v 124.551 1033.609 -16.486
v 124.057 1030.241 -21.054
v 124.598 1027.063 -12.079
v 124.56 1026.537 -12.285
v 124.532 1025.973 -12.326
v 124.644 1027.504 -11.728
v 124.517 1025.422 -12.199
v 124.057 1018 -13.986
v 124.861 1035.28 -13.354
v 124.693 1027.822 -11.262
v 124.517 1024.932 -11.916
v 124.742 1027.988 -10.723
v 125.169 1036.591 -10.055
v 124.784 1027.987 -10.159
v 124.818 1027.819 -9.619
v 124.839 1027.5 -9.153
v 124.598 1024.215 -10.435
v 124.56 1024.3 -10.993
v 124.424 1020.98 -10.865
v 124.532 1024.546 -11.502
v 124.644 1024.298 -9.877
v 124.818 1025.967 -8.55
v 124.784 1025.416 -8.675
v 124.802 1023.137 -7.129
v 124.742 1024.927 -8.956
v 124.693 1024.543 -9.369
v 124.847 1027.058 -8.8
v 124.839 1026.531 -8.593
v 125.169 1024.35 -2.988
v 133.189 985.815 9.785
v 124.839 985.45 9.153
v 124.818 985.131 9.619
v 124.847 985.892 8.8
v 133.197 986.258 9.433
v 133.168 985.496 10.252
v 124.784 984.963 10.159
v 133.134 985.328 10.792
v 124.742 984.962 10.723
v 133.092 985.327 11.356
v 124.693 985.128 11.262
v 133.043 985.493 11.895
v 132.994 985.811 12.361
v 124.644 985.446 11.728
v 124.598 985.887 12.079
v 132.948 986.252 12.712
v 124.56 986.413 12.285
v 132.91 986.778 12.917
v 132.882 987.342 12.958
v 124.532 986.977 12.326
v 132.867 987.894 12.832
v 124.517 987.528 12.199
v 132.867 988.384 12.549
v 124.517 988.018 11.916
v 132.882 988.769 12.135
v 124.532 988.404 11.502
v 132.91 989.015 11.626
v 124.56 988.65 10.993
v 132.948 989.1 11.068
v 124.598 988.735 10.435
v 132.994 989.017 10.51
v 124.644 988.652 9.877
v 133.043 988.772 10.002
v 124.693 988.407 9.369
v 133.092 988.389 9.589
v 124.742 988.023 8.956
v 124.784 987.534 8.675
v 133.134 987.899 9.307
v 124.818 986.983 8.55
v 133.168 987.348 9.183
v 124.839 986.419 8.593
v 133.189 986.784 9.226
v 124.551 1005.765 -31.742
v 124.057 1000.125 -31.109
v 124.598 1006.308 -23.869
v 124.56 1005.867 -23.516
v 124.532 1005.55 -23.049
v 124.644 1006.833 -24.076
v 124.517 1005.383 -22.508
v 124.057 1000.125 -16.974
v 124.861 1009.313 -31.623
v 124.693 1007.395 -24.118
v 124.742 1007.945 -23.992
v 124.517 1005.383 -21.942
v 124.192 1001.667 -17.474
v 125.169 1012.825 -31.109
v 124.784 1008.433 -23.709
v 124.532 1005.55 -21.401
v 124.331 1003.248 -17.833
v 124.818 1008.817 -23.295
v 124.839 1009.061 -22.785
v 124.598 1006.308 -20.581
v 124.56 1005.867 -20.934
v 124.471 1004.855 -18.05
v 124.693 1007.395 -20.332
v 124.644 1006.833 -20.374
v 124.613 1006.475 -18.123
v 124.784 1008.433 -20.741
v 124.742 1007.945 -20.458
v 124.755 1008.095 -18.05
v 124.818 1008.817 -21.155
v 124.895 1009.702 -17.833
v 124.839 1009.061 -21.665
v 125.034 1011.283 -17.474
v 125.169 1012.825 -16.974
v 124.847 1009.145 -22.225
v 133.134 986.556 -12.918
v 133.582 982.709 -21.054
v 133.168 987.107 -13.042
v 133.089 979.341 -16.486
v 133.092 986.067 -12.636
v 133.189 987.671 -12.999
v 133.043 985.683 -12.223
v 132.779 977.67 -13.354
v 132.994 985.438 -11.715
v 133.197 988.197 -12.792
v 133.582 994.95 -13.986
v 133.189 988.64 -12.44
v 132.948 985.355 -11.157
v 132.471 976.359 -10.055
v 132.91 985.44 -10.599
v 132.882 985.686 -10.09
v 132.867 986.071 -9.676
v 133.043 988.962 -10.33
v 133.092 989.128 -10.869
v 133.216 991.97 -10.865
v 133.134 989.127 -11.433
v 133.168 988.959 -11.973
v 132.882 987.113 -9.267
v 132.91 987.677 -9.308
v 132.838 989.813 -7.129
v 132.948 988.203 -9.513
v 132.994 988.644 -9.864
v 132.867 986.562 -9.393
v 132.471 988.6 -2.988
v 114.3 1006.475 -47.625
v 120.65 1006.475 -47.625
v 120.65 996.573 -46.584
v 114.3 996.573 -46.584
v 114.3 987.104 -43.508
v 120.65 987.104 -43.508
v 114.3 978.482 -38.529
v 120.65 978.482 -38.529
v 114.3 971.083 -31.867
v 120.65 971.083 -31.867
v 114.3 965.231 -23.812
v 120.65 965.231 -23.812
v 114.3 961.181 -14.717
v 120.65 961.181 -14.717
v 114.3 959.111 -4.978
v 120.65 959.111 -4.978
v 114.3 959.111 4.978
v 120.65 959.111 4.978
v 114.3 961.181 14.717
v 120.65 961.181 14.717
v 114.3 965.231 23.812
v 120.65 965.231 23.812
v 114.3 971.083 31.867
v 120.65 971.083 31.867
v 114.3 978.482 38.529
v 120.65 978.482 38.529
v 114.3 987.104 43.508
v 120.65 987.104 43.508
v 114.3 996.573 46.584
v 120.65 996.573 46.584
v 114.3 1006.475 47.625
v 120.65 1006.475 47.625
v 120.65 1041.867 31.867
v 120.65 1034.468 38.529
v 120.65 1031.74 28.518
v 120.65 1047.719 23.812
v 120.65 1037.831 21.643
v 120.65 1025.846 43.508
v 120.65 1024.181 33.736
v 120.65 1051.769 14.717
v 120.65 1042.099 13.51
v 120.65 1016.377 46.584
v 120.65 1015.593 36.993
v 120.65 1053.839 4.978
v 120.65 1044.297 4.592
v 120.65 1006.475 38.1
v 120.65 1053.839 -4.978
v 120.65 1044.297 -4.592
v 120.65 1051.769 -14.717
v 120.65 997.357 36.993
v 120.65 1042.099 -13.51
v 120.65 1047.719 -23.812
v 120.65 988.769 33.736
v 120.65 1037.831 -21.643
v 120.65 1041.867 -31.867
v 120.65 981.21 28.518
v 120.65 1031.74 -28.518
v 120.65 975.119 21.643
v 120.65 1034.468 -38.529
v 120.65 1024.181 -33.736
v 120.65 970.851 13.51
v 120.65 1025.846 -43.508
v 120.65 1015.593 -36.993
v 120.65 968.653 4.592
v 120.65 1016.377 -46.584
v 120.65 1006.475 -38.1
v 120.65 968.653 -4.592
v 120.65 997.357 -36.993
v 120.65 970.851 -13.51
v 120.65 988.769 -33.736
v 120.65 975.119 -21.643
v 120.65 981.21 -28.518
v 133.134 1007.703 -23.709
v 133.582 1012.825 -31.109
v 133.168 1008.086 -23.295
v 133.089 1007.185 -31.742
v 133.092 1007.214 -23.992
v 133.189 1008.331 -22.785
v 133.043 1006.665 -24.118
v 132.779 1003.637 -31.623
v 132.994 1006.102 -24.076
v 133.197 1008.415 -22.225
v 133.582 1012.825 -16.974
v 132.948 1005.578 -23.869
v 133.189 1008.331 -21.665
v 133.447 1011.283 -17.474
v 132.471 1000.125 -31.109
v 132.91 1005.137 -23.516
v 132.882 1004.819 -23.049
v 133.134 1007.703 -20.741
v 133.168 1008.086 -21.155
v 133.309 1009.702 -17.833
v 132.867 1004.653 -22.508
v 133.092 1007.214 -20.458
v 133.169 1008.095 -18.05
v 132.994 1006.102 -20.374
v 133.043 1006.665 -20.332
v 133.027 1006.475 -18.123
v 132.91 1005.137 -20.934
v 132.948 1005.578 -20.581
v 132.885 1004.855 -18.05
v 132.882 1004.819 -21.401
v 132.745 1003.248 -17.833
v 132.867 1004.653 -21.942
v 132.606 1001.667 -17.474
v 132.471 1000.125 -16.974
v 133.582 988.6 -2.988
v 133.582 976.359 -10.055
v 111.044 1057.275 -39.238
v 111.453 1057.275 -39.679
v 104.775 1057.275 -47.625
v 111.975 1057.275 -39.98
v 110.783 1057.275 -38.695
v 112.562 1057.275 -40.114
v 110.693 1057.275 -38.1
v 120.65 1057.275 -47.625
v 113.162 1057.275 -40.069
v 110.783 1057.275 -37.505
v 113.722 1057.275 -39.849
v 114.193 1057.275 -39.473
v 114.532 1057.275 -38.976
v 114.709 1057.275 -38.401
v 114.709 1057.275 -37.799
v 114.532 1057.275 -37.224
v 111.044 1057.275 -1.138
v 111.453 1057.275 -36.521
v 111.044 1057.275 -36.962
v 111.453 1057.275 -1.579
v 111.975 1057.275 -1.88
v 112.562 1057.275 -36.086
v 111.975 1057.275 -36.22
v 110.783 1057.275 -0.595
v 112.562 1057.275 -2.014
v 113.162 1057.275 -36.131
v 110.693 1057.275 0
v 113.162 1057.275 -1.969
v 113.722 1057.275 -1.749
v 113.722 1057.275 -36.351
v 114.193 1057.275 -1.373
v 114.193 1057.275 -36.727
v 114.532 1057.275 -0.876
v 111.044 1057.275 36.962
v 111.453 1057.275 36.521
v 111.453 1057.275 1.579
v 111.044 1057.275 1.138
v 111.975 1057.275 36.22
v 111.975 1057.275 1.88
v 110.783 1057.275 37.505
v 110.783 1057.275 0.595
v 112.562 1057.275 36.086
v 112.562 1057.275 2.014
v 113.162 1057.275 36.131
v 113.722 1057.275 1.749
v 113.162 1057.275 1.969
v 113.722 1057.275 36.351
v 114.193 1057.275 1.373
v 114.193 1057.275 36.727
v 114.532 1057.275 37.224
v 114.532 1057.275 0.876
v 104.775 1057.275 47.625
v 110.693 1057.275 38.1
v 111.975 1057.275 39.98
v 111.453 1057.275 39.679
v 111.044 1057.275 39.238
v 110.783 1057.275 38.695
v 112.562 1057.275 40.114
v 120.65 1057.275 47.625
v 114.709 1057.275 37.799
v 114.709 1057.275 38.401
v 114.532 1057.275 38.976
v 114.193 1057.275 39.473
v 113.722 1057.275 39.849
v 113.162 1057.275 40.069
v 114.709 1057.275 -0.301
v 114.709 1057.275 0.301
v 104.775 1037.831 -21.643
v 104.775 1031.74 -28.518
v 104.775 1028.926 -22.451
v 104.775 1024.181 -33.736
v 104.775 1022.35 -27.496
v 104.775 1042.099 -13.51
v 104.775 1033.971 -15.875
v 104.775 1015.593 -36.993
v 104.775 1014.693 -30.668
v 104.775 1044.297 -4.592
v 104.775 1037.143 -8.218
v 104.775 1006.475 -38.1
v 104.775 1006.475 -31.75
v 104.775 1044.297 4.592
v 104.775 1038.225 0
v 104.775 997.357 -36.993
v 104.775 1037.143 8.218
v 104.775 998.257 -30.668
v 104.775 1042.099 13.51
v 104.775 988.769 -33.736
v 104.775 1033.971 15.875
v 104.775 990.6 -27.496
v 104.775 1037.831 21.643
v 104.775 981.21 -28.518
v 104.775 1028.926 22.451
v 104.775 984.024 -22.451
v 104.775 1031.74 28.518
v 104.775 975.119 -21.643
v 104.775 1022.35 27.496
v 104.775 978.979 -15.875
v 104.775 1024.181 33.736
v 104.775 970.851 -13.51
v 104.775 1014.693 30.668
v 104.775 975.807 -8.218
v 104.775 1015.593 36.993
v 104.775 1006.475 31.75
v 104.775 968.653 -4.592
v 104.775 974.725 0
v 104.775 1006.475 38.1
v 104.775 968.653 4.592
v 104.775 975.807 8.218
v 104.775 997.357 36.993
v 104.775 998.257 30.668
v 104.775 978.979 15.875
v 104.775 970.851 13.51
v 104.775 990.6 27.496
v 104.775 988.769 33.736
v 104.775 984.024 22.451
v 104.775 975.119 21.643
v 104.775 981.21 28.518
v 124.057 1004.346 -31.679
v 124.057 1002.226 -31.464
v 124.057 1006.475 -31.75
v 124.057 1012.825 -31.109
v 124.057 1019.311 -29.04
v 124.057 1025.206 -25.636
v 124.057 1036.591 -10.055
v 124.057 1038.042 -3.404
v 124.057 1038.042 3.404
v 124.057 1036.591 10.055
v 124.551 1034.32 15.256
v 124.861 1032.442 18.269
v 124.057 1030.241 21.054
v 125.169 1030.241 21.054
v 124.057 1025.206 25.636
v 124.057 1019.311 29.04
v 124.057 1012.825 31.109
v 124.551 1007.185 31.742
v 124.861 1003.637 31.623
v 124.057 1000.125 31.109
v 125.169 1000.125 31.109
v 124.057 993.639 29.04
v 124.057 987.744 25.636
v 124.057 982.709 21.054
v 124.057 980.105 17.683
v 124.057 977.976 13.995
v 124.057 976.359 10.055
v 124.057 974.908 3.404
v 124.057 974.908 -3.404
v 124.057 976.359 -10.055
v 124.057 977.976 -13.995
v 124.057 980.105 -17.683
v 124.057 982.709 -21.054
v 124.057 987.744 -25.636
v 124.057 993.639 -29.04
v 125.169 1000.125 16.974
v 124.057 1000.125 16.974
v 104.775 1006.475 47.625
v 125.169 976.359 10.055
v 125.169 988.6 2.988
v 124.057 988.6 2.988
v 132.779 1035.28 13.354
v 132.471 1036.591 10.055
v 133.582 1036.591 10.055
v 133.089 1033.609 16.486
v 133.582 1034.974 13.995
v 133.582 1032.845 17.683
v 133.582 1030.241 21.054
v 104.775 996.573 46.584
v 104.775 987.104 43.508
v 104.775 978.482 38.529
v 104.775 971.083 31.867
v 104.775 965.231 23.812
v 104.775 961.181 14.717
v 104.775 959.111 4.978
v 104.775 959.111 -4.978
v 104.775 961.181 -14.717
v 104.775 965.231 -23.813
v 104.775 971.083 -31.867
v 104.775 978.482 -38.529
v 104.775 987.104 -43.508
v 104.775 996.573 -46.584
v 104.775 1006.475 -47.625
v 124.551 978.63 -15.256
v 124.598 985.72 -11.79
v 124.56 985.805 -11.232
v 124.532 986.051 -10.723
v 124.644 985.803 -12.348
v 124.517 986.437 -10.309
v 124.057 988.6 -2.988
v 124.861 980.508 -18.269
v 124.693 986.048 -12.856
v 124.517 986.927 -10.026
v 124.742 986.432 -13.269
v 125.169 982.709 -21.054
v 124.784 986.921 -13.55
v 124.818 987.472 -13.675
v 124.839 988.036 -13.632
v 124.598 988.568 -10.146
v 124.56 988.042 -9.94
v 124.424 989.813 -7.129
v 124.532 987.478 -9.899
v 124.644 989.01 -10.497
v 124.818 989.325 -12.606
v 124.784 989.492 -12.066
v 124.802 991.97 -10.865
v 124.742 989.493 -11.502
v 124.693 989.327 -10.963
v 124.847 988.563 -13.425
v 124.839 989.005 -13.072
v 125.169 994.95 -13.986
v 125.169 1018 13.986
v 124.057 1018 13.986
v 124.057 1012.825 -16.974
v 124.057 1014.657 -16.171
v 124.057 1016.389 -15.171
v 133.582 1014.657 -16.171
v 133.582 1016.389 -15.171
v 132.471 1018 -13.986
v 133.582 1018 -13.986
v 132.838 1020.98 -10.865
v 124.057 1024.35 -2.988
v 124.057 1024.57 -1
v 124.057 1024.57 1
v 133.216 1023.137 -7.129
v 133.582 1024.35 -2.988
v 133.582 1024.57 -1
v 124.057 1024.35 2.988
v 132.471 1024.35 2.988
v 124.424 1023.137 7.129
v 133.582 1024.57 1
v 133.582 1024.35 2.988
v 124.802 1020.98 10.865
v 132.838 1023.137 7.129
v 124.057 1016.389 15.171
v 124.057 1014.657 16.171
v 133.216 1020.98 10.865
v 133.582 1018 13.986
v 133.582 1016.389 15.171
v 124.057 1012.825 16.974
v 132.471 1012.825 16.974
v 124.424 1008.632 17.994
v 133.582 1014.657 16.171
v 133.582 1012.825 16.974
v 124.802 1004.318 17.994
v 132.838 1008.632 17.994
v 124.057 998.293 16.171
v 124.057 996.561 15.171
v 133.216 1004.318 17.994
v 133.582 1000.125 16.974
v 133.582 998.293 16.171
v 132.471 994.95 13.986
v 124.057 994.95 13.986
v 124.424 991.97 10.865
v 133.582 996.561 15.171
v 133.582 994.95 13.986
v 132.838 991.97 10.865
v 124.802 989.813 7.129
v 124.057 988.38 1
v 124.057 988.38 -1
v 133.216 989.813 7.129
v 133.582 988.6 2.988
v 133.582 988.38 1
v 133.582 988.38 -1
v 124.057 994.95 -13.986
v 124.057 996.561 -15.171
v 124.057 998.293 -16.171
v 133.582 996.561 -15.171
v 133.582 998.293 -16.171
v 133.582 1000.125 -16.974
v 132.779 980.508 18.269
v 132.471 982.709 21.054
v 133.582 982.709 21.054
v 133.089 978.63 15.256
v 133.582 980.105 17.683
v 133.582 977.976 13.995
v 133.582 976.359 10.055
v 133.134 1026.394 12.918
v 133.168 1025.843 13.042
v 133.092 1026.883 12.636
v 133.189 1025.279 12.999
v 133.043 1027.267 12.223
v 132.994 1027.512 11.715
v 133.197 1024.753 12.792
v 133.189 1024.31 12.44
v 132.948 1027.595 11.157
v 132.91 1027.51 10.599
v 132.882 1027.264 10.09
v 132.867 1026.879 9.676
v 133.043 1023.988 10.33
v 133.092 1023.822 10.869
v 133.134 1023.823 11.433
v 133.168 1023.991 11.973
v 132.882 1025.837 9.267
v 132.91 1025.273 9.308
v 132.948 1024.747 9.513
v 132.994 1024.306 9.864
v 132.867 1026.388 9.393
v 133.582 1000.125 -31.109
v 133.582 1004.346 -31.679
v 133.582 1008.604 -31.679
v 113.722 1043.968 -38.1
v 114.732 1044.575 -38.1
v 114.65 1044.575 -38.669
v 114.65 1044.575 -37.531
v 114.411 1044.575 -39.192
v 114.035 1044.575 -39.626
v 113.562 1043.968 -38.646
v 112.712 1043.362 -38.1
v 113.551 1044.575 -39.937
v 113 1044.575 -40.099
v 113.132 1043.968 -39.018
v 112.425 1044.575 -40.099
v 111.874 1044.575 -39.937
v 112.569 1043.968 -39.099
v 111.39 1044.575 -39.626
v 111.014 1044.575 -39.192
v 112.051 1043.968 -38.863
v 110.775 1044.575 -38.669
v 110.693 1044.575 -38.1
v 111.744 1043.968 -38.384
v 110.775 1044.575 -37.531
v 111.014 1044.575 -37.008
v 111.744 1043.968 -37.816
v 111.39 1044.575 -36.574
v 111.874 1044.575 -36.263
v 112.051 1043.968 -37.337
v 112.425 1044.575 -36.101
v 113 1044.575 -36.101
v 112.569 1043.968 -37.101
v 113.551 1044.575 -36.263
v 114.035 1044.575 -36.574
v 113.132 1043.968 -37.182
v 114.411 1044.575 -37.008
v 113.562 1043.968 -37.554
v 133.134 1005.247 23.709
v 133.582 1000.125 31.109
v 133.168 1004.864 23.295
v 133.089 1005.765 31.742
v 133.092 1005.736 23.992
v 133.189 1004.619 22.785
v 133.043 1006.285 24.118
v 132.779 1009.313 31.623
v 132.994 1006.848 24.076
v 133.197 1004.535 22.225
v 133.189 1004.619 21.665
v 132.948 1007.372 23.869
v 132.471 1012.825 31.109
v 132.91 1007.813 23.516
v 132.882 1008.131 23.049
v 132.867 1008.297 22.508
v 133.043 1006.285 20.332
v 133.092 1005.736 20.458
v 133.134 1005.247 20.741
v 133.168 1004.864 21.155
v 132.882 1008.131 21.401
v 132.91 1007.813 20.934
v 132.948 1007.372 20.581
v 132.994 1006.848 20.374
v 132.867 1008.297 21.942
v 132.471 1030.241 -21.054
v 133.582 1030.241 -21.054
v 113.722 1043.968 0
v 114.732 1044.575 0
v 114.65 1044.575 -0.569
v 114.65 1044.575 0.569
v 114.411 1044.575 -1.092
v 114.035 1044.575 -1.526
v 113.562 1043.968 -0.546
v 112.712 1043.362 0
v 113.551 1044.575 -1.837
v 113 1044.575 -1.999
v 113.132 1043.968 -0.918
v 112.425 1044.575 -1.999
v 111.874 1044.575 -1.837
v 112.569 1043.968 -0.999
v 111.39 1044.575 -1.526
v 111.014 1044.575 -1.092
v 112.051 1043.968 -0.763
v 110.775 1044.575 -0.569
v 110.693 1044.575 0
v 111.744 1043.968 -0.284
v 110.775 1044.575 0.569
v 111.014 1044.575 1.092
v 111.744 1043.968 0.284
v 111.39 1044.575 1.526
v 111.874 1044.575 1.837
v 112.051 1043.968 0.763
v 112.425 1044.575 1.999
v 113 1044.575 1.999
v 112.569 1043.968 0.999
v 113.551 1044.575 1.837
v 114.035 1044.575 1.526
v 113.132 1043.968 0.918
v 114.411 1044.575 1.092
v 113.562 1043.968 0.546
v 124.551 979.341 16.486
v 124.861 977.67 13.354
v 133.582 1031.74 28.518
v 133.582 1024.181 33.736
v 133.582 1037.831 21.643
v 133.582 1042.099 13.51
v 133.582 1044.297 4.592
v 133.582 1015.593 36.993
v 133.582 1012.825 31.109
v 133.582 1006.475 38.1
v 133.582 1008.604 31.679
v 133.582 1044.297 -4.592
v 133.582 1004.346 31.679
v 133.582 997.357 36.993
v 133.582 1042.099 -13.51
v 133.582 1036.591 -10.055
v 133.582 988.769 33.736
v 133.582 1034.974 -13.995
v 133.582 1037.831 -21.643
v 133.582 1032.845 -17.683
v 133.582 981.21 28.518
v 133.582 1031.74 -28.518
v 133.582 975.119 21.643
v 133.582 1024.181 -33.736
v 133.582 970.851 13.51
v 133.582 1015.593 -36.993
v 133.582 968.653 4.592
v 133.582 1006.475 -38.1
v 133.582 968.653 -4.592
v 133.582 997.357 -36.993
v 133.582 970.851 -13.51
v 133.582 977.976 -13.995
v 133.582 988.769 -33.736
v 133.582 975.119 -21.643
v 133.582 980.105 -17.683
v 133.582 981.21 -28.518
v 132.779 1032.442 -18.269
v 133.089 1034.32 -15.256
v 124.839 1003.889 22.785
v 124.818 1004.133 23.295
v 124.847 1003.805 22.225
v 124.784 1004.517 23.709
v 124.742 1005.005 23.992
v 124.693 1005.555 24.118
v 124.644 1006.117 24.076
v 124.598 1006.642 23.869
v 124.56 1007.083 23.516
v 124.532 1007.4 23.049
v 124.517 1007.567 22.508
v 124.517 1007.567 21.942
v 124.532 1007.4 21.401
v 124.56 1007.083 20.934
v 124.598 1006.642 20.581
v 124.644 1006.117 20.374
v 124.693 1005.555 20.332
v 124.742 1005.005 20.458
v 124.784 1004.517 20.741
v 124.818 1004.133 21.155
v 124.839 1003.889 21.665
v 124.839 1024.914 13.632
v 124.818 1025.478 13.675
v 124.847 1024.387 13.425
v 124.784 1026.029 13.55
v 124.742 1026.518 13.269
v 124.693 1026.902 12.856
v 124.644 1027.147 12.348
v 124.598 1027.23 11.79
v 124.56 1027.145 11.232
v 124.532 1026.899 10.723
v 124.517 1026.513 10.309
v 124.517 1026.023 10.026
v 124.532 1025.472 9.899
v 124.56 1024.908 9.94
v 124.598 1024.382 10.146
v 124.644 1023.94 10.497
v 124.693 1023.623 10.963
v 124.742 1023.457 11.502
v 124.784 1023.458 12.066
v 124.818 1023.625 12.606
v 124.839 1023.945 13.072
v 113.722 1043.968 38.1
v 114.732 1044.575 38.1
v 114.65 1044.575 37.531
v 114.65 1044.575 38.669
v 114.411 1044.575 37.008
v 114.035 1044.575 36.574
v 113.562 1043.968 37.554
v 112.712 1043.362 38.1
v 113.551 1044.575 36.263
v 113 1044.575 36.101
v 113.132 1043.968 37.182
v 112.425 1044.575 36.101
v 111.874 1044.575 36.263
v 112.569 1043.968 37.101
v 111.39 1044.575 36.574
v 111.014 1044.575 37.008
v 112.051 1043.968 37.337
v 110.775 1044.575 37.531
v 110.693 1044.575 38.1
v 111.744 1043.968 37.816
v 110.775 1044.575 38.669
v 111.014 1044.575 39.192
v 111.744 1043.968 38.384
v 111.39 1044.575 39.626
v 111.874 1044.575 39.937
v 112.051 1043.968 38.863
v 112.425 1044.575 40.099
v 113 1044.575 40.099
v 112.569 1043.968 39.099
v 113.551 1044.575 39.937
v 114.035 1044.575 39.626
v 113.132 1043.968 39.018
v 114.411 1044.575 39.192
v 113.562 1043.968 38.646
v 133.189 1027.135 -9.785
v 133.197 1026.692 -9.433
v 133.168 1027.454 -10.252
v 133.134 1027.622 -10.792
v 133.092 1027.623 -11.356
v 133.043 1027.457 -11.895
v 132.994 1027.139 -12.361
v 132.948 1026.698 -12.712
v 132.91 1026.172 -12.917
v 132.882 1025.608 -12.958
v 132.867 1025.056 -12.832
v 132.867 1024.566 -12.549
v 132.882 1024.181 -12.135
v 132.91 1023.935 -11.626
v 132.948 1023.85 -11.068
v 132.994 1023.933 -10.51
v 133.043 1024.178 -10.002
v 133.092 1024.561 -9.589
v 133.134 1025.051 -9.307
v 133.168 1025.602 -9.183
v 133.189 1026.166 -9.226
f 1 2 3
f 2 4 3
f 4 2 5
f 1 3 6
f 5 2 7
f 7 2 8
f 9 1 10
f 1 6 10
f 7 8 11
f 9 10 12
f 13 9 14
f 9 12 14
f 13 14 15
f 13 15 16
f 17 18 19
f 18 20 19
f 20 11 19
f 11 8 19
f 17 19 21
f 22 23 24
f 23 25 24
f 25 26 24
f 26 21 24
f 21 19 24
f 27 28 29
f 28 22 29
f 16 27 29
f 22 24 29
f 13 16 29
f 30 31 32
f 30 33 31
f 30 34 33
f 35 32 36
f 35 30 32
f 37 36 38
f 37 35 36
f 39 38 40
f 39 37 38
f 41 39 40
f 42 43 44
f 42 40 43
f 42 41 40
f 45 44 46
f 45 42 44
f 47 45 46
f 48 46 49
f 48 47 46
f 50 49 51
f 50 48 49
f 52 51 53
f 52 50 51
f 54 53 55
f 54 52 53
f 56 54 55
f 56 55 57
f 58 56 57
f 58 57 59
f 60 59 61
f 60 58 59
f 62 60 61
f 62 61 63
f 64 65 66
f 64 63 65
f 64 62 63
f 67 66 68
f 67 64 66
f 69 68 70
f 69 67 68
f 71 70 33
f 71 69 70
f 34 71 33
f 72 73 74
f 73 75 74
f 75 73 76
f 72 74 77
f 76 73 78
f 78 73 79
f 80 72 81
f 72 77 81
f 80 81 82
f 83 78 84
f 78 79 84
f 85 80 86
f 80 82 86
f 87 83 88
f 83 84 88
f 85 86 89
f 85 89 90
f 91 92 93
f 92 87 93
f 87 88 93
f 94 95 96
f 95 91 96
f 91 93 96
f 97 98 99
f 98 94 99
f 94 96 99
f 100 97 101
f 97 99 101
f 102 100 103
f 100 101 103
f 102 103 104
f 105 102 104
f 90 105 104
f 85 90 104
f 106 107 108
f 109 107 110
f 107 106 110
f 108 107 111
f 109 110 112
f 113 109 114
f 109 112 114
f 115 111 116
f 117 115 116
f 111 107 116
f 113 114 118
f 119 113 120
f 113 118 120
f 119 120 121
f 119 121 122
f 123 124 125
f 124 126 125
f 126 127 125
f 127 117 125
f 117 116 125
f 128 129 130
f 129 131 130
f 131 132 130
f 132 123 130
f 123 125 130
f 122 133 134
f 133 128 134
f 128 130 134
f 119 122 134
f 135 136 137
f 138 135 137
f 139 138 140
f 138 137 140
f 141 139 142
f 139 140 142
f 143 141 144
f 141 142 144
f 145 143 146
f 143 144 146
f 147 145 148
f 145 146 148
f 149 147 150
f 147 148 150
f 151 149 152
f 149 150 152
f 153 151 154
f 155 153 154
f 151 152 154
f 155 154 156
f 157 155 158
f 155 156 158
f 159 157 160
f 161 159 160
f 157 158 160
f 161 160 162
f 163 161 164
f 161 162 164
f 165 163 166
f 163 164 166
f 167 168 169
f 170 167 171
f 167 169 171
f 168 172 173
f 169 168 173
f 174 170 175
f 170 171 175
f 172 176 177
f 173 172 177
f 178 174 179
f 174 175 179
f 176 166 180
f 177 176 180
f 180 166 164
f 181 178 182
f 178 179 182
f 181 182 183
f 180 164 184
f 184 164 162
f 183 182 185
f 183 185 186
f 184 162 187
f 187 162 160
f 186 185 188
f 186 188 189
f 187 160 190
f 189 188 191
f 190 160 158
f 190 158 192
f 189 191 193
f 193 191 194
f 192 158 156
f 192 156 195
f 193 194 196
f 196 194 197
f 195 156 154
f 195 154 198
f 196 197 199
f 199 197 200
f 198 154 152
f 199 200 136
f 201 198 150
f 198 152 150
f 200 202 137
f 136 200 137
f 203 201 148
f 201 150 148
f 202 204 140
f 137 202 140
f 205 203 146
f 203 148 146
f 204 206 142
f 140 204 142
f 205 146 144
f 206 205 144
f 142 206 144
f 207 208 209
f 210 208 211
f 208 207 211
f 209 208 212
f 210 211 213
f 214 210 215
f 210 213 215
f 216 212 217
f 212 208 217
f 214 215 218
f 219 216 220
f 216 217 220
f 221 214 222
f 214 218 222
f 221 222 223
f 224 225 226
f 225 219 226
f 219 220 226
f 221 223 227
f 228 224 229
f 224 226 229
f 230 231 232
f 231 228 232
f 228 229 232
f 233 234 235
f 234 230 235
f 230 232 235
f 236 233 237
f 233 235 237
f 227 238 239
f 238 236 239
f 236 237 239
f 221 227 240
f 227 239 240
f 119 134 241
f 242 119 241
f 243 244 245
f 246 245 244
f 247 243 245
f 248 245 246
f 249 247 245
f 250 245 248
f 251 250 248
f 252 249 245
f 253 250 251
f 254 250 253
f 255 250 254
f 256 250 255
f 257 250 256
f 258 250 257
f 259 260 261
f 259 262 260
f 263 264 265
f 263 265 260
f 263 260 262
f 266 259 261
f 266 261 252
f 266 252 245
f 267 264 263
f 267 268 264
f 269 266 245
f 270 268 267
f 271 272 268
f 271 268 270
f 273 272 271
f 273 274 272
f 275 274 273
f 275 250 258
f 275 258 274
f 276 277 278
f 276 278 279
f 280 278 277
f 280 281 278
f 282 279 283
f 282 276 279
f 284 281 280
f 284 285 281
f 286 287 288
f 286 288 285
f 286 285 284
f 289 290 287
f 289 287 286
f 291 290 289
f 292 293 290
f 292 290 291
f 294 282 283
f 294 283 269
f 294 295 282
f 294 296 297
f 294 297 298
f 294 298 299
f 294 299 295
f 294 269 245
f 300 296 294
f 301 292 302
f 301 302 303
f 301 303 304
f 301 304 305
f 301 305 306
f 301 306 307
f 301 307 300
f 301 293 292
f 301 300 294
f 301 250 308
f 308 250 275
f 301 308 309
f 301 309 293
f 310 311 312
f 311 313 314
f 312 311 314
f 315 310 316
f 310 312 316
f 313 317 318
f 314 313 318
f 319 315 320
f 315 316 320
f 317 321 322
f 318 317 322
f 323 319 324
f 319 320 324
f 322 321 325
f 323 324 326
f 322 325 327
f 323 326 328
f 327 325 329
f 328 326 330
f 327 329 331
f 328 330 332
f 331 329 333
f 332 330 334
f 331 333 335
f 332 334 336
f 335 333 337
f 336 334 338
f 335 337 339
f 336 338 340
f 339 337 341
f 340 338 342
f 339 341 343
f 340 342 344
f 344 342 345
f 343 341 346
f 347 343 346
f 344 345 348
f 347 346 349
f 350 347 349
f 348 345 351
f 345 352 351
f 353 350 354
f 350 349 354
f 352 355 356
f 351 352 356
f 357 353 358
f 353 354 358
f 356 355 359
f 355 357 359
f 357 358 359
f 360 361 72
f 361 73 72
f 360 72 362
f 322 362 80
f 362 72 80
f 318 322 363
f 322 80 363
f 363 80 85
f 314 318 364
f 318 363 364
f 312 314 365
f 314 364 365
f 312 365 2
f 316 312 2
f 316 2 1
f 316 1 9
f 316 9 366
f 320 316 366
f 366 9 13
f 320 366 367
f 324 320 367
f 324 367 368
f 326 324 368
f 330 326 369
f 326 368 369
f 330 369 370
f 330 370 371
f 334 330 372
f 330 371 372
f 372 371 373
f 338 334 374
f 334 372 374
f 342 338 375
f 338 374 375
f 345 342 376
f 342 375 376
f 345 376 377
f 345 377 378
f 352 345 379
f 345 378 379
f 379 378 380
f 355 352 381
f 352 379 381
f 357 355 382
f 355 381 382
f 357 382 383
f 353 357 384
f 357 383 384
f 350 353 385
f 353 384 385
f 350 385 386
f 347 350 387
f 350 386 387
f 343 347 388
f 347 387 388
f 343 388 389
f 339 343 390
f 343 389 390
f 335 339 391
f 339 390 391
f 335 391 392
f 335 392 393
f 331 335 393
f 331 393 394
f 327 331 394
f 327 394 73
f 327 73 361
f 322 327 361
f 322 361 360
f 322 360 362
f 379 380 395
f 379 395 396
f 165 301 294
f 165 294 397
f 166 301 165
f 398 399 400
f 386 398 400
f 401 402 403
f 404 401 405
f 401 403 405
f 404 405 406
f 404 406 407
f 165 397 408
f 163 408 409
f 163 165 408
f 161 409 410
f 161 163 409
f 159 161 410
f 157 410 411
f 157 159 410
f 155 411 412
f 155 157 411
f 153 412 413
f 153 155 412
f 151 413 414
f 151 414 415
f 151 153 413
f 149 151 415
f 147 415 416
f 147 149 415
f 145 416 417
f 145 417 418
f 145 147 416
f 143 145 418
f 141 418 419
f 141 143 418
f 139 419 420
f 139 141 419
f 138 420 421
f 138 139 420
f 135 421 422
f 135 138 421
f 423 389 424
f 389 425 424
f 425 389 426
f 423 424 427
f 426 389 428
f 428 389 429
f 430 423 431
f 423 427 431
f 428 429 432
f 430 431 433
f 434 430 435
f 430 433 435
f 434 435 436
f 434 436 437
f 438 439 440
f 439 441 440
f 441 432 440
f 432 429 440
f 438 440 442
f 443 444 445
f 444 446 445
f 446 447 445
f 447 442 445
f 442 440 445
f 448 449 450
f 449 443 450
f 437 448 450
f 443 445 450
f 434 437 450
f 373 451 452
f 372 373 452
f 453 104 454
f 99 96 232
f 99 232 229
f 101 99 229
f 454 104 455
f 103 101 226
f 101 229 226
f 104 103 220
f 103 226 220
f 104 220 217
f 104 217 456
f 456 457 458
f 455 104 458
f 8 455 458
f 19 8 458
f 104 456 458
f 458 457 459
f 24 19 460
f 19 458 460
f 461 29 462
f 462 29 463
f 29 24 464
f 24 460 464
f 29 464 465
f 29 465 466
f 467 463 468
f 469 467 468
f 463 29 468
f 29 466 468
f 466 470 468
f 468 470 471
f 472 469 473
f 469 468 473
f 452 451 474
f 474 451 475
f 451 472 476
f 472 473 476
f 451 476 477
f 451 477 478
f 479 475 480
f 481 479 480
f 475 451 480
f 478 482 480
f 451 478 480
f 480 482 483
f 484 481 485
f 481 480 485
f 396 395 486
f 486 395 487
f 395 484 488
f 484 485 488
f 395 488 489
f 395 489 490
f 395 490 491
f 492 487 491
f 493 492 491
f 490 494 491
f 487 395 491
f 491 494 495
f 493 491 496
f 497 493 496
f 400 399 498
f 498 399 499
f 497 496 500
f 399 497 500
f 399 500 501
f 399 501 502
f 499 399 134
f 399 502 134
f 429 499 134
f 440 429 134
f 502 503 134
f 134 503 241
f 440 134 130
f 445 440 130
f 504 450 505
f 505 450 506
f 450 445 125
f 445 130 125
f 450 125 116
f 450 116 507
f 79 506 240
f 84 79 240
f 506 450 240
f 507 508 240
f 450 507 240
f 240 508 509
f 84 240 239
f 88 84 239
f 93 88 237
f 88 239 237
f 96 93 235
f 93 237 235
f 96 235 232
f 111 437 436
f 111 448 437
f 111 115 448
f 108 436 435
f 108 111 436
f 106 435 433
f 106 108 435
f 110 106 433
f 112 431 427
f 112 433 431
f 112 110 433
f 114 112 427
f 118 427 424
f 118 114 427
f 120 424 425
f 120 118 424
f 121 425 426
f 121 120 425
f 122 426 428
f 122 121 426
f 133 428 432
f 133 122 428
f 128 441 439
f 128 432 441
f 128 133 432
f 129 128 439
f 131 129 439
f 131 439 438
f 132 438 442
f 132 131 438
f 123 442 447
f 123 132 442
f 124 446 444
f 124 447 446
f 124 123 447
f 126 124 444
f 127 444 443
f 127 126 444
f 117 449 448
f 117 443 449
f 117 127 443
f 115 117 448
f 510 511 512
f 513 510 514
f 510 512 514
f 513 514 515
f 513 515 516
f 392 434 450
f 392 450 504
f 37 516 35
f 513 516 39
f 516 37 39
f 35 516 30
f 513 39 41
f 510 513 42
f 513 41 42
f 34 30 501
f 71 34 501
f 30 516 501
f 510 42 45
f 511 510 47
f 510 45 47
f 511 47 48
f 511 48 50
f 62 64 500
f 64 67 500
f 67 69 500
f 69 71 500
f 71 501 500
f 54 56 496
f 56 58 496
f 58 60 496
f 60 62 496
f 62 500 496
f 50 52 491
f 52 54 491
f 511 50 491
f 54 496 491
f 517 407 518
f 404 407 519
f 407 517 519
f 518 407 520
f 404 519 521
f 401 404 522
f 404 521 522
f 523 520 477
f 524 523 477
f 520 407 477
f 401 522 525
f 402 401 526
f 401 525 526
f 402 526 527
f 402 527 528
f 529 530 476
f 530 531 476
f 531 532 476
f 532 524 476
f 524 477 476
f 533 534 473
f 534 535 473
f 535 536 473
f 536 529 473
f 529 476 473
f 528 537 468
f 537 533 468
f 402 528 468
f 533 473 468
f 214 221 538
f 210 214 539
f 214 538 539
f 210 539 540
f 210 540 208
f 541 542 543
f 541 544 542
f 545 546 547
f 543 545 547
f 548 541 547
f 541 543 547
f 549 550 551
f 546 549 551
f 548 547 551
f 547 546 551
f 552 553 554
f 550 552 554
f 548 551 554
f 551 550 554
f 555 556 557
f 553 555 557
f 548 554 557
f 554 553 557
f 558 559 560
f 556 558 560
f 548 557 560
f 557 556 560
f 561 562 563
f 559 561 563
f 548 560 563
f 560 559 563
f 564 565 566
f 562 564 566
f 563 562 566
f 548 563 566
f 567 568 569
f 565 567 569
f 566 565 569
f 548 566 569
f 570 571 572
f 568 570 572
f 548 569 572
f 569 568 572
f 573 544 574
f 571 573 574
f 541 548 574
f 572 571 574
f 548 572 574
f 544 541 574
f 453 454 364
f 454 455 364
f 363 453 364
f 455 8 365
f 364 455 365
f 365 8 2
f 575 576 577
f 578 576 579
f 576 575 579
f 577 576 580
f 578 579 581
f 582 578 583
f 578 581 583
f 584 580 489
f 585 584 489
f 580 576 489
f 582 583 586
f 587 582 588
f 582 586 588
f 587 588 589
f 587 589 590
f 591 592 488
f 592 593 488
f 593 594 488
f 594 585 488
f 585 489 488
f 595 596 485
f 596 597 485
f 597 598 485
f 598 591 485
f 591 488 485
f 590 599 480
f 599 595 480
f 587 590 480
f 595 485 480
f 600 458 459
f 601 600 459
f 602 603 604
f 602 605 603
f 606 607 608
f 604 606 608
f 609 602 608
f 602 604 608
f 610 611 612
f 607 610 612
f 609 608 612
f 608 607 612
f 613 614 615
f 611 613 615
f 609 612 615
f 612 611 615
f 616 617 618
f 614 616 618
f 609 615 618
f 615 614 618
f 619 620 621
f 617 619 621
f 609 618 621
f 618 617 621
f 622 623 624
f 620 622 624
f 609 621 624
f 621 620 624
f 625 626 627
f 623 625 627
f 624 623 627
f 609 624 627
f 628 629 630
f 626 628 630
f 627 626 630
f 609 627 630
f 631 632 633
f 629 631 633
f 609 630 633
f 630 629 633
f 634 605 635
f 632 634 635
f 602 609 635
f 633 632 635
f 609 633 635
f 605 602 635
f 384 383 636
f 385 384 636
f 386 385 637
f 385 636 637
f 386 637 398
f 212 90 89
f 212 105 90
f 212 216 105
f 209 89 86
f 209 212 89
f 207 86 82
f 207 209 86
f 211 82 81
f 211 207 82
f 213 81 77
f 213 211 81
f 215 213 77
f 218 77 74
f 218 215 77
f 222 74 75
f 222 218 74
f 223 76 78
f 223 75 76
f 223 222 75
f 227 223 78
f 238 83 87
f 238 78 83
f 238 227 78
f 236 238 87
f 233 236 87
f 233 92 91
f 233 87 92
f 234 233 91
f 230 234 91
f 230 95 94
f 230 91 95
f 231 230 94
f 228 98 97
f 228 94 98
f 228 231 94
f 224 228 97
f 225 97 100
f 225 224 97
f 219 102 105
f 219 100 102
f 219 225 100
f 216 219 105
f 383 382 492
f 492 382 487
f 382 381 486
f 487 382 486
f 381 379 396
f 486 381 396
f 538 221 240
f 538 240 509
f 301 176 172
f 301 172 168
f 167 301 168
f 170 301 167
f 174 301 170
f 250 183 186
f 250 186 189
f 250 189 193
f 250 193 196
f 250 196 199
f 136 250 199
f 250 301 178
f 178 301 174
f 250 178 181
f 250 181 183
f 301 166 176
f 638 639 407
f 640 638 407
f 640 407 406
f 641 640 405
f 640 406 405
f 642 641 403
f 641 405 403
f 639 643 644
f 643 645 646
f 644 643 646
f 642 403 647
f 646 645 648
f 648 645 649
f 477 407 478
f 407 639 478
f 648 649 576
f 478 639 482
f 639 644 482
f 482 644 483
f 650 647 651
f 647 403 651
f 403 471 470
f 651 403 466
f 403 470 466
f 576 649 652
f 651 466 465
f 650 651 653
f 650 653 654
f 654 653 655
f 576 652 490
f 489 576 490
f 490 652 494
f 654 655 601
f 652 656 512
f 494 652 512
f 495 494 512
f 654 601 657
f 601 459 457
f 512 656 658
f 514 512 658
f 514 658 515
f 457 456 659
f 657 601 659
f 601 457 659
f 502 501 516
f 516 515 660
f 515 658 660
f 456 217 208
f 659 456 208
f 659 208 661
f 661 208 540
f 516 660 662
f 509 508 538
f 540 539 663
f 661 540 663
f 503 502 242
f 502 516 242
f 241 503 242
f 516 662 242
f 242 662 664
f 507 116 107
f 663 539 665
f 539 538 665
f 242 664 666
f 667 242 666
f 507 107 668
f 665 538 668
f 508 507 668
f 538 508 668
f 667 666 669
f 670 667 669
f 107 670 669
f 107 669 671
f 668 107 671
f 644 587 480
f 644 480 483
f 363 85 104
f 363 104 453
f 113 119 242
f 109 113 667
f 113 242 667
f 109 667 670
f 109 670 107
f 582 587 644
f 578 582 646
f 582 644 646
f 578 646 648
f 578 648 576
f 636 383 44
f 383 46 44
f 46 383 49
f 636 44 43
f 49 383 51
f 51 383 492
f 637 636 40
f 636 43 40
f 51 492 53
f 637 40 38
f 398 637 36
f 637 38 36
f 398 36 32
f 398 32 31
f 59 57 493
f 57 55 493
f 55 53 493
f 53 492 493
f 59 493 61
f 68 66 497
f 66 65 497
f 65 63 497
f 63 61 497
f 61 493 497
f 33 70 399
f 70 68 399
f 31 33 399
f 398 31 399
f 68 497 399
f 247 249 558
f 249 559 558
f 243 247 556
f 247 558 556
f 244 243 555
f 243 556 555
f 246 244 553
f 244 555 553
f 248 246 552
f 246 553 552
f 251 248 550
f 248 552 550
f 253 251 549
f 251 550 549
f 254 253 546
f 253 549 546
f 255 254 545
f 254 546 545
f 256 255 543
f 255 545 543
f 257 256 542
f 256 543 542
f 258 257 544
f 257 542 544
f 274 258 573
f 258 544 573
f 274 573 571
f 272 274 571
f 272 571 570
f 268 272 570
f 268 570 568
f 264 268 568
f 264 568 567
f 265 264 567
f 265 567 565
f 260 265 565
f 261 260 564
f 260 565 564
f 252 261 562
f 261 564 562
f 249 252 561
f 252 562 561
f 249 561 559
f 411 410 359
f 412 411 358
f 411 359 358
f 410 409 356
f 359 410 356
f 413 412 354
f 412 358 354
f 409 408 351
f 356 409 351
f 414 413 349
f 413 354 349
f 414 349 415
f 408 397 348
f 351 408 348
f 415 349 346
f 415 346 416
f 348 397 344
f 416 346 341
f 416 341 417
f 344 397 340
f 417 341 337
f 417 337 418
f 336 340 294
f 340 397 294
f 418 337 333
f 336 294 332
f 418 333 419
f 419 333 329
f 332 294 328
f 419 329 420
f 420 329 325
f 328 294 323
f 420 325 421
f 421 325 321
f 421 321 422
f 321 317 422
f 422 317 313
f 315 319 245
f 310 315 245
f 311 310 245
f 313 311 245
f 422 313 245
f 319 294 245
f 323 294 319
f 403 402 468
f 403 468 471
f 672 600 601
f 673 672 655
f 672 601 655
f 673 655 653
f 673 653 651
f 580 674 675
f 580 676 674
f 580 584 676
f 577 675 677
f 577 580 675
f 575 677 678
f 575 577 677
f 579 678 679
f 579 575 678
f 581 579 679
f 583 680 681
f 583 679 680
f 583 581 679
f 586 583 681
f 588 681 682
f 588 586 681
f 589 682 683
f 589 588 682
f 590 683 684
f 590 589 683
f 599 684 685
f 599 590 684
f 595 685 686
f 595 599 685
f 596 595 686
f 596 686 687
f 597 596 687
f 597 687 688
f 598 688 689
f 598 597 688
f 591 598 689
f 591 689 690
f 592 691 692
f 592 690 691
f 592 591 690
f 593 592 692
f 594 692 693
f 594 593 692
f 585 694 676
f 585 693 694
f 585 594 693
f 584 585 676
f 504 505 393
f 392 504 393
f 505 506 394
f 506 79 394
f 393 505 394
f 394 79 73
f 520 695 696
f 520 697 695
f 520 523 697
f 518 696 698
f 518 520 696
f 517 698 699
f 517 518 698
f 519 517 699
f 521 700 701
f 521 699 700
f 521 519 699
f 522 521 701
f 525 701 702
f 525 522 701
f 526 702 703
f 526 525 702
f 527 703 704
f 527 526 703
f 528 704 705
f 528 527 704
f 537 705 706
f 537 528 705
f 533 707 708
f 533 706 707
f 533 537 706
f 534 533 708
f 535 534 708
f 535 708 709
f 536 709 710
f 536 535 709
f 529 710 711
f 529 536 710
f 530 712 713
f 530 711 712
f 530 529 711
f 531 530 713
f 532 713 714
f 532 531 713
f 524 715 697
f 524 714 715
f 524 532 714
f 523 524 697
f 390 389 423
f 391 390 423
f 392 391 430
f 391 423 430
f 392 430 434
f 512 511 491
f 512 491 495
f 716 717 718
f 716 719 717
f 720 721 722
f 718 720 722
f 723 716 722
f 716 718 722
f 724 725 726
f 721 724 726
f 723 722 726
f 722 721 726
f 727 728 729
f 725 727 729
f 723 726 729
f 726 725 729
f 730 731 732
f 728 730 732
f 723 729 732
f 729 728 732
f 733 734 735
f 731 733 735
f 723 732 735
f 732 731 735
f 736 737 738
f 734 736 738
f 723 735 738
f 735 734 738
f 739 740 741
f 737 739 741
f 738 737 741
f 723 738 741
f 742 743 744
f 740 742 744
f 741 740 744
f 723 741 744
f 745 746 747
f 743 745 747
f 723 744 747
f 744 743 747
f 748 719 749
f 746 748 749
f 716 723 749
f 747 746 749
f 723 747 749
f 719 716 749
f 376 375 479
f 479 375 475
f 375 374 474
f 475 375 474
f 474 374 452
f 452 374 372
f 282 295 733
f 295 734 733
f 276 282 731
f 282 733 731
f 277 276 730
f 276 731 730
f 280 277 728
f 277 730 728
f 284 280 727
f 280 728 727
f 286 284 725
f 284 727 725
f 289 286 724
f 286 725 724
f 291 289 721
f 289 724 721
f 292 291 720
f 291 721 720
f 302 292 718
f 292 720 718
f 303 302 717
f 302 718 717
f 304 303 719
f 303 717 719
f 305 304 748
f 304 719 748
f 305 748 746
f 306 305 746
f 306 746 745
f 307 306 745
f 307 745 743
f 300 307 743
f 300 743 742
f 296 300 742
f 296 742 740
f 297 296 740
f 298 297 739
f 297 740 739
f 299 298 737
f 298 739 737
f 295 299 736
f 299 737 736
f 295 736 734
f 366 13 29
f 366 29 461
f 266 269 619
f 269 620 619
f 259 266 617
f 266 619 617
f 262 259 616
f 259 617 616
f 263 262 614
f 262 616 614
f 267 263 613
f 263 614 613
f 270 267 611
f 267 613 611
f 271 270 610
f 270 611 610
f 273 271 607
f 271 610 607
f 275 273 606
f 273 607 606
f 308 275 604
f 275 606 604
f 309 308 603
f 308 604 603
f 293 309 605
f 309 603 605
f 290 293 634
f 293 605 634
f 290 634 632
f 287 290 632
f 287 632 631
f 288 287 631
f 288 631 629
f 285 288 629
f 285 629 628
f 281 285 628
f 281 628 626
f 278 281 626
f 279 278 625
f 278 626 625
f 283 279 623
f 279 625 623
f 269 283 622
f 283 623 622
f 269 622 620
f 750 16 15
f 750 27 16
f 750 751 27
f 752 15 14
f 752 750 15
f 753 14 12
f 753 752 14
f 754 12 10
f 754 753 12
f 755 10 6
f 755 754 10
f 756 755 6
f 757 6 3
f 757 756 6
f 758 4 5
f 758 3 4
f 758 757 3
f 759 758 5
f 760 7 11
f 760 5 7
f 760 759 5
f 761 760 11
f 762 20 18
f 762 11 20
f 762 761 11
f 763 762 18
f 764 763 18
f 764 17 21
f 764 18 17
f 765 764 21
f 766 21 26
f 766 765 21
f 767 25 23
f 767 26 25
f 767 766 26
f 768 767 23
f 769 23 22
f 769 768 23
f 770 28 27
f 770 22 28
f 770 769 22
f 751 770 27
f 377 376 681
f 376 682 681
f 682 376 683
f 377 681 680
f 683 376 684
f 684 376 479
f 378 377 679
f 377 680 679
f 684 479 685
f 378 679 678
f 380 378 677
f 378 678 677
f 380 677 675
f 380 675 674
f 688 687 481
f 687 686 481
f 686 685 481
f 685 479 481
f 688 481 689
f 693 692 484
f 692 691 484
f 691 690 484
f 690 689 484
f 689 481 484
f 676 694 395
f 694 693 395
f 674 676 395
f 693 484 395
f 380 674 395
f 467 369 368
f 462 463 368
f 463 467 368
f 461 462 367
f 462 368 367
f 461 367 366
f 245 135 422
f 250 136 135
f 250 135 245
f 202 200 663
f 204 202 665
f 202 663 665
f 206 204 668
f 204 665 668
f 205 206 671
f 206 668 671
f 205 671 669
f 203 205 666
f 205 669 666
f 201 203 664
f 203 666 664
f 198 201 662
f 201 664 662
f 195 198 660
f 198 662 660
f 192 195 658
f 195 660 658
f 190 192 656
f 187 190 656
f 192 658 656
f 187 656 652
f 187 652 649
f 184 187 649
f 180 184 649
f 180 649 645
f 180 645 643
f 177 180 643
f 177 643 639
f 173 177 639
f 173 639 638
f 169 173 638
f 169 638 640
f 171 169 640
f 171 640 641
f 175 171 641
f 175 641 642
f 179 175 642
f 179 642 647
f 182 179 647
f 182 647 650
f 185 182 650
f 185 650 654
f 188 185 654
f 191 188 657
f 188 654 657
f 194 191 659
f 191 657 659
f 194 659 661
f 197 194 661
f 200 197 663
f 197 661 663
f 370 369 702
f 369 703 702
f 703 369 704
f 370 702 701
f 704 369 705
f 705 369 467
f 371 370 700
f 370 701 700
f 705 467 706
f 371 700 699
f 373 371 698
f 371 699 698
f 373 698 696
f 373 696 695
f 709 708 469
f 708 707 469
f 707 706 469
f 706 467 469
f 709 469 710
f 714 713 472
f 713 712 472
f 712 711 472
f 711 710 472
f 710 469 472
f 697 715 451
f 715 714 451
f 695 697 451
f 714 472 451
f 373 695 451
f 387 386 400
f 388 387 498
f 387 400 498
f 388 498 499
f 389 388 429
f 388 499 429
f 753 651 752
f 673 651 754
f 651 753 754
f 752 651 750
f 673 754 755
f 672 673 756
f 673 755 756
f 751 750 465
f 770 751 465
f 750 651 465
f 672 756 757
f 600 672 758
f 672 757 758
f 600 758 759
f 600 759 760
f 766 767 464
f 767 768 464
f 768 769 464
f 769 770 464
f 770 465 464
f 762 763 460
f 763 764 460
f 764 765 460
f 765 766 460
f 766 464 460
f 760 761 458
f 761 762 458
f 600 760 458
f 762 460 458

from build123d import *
from build123d.topology import SkipClean

# Parameters (mm, degrees)
SKETCH7_R                  = 38.1
SKETCH7_R_2                = 18.1229
BOSS_EXTRUDE3_DEPTH        = 9.525
CUT_EXTRUDE4_REACH         = 1065.597
CUT_EXTRUDE4_END_RADIUS    = 31.75
CIRPATTERN1_COUNT          = 6
SKETCH19_R                 = 38.1
BOSS_EXTRUDE4_DEPTH        = 15.875
F_10_32_TAPPED_HOLE1_D     = 4.0386
F_10_32_TAPPED_HOLE1_DEPTH = 12.7
F_10_32_TAPPED_HOLE1_TIP   = 1.213317848


with BuildPart() as part:
    # Sketch1 → Revolve1 (revolve)
    with BuildSketch(Plane.XY, mode=Mode.PRIVATE) as revolve1_sk:
        Polygon((104.775, 1038.225), (104.775, 1044.575), (114.3, 1044.575), (114.3, 1054.1), (120.65, 1054.1), (120.65, 1044.575), (133.582417551, 1044.575), (133.582417551, 1038.225), align=None)
    revolve(revolve1_sk.sketch.rotate(Axis((184.382417551, 1006.475, 0), (-1, 0, 0)), 90), axis=Axis((184.382417551, 1006.475, 0), (-1, 0, 0)))

    # Sketch7 → Boss-Extrude3 (add)
    with BuildSketch(Plane(origin=(133.582417551, 0, 0), x_dir=(0, 0, -1), z_dir=(1, 0, 0))):
        with Locations((0, 1006.475)):
            Circle(SKETCH7_R)
        with Locations((0, 1006.475)):
            Circle(SKETCH7_R_2, mode=Mode.SUBTRACT)
    extrude(amount=-BOSS_EXTRUDE3_DEPTH)

    # Cut-Extrude4: up to this cylinder (the profile starts inside it)
    cut_extrude4_end = Plane(origin=(128.8199175, 1006.475, 0), z_dir=(1, 0, 0)) * Cylinder(CUT_EXTRUDE4_END_RADIUS, 2204.478263, mode=Mode.PRIVATE)
    # Sketch8 → Cut-Extrude4 (cut, up to the surface)
    with BuildSketch(Plane.XY, mode=Mode.PRIVATE) as cut_extrude4_sk1:
        Polygon((133.582417551, 1000.125), (133.582417551, 1012.825), (132.471311524, 1000.125), align=None)
    cut_extrude4_tool1 = extrude(cut_extrude4_sk1.sketch, amount=-CUT_EXTRUDE4_REACH, mode=Mode.PRIVATE) & cut_extrude4_end
    # Sketch8 → Cut-Extrude4 (cut, up to the surface)
    with BuildSketch(Plane.XY, mode=Mode.PRIVATE) as cut_extrude4_sk2:
        Polygon((124.057417551, 1012.825), (124.057417551, 1000.125), (125.168523578, 1012.825), align=None)
    cut_extrude4_tool2 = extrude(cut_extrude4_sk2.sketch, amount=-CUT_EXTRUDE4_REACH, mode=Mode.PRIVATE) & cut_extrude4_end
    cut_extrude4 = cut_extrude4_tool1.solids().sort_by_distance((133.212049, 1004.358333, 0))[0] + cut_extrude4_tool2.solids().sort_by_distance((124.427786, 1008.591667, 0))[0]
    add(cut_extrude4, mode=Mode.SUBTRACT)

    # Sketch18 → #10-24 Tapped Hole2 (revolve, cut)
    with BuildSketch(Plane(origin=(133.031084587, 1006.523235384, -22.225), x_dir=(0.08715574274765736, 0.9961946980917457, 0), z_dir=(0, 0, 1))):
        Polygon((0, 0), (0, 16.126824014), (1.89865, 14.986), (1.89865, 0), align=None)
    f_10_24_tapped_hole2 = revolve(axis=Axis((139.35692092, 1005.969796418, -22.225), (-0.9961946980917457, 0.08715574274765729, 0)), mode=Mode.SUBTRACT)

    # CirPattern1: Cut-Extrude4, #10-24 Tapped Hole2 ×6 about axis
    with SkipClean():  # the faces are left unmerged after this step: merging them gives an invalid solid
        cirpattern1_axis = Axis((0, 1006.475, 0), (1, 0, 0))
        add([cut_extrude4.rotate(cirpattern1_axis, i * 360 / CIRPATTERN1_COUNT) for i in range(1, CIRPATTERN1_COUNT)], mode=Mode.SUBTRACT)
        add([f_10_24_tapped_hole2.rotate(cirpattern1_axis, i * 360 / CIRPATTERN1_COUNT) for i in range(1, CIRPATTERN1_COUNT)], mode=Mode.SUBTRACT)
    add(part.part.scale(1), mode=Mode.REPLACE)  # the faces are merged on a copy

    # Sketch19 → Boss-Extrude4 (add)
    with SkipClean():  # the faces are left unmerged after this step: merging them gives an invalid solid
        with BuildSketch(Plane.ZY.offset(-120.65)):
            with BuildLine():
                Line((-47.625, 1006.475), (-47.625, 1057.275))
                Line((-47.625, 1057.275), (47.625, 1057.275))
                Line((47.625, 1057.275), (47.625, 1006.475))
                ThreePointArc((47.625, 1006.475), (0, 958.85), (-47.625, 1006.475))
            make_face()
            with Locations(Location((0, 1006.475, 0), (0, 0, 180))):
                Circle(SKETCH19_R, mode=Mode.SUBTRACT)
        extrude(amount=BOSS_EXTRUDE4_DEPTH)

    # #10-32 Tapped Hole1
    with Locations(Plane(origin=(0, 1057.275, 0), x_dir=(1, 0, 0), z_dir=(0, 1, 0))):
        with Locations((112.7125, 38.1), (112.7125, 0), (112.7125, -38.1)):
            Hole(F_10_32_TAPPED_HOLE1_D / 2, depth=F_10_32_TAPPED_HOLE1_DEPTH)
            with Locations((0, 0, -(F_10_32_TAPPED_HOLE1_DEPTH + F_10_32_TAPPED_HOLE1_TIP / 2))):  # 118° drill point
                Cone(0, F_10_32_TAPPED_HOLE1_D / 2, F_10_32_TAPPED_HOLE1_TIP, mode=Mode.SUBTRACT)


solid = part.part
